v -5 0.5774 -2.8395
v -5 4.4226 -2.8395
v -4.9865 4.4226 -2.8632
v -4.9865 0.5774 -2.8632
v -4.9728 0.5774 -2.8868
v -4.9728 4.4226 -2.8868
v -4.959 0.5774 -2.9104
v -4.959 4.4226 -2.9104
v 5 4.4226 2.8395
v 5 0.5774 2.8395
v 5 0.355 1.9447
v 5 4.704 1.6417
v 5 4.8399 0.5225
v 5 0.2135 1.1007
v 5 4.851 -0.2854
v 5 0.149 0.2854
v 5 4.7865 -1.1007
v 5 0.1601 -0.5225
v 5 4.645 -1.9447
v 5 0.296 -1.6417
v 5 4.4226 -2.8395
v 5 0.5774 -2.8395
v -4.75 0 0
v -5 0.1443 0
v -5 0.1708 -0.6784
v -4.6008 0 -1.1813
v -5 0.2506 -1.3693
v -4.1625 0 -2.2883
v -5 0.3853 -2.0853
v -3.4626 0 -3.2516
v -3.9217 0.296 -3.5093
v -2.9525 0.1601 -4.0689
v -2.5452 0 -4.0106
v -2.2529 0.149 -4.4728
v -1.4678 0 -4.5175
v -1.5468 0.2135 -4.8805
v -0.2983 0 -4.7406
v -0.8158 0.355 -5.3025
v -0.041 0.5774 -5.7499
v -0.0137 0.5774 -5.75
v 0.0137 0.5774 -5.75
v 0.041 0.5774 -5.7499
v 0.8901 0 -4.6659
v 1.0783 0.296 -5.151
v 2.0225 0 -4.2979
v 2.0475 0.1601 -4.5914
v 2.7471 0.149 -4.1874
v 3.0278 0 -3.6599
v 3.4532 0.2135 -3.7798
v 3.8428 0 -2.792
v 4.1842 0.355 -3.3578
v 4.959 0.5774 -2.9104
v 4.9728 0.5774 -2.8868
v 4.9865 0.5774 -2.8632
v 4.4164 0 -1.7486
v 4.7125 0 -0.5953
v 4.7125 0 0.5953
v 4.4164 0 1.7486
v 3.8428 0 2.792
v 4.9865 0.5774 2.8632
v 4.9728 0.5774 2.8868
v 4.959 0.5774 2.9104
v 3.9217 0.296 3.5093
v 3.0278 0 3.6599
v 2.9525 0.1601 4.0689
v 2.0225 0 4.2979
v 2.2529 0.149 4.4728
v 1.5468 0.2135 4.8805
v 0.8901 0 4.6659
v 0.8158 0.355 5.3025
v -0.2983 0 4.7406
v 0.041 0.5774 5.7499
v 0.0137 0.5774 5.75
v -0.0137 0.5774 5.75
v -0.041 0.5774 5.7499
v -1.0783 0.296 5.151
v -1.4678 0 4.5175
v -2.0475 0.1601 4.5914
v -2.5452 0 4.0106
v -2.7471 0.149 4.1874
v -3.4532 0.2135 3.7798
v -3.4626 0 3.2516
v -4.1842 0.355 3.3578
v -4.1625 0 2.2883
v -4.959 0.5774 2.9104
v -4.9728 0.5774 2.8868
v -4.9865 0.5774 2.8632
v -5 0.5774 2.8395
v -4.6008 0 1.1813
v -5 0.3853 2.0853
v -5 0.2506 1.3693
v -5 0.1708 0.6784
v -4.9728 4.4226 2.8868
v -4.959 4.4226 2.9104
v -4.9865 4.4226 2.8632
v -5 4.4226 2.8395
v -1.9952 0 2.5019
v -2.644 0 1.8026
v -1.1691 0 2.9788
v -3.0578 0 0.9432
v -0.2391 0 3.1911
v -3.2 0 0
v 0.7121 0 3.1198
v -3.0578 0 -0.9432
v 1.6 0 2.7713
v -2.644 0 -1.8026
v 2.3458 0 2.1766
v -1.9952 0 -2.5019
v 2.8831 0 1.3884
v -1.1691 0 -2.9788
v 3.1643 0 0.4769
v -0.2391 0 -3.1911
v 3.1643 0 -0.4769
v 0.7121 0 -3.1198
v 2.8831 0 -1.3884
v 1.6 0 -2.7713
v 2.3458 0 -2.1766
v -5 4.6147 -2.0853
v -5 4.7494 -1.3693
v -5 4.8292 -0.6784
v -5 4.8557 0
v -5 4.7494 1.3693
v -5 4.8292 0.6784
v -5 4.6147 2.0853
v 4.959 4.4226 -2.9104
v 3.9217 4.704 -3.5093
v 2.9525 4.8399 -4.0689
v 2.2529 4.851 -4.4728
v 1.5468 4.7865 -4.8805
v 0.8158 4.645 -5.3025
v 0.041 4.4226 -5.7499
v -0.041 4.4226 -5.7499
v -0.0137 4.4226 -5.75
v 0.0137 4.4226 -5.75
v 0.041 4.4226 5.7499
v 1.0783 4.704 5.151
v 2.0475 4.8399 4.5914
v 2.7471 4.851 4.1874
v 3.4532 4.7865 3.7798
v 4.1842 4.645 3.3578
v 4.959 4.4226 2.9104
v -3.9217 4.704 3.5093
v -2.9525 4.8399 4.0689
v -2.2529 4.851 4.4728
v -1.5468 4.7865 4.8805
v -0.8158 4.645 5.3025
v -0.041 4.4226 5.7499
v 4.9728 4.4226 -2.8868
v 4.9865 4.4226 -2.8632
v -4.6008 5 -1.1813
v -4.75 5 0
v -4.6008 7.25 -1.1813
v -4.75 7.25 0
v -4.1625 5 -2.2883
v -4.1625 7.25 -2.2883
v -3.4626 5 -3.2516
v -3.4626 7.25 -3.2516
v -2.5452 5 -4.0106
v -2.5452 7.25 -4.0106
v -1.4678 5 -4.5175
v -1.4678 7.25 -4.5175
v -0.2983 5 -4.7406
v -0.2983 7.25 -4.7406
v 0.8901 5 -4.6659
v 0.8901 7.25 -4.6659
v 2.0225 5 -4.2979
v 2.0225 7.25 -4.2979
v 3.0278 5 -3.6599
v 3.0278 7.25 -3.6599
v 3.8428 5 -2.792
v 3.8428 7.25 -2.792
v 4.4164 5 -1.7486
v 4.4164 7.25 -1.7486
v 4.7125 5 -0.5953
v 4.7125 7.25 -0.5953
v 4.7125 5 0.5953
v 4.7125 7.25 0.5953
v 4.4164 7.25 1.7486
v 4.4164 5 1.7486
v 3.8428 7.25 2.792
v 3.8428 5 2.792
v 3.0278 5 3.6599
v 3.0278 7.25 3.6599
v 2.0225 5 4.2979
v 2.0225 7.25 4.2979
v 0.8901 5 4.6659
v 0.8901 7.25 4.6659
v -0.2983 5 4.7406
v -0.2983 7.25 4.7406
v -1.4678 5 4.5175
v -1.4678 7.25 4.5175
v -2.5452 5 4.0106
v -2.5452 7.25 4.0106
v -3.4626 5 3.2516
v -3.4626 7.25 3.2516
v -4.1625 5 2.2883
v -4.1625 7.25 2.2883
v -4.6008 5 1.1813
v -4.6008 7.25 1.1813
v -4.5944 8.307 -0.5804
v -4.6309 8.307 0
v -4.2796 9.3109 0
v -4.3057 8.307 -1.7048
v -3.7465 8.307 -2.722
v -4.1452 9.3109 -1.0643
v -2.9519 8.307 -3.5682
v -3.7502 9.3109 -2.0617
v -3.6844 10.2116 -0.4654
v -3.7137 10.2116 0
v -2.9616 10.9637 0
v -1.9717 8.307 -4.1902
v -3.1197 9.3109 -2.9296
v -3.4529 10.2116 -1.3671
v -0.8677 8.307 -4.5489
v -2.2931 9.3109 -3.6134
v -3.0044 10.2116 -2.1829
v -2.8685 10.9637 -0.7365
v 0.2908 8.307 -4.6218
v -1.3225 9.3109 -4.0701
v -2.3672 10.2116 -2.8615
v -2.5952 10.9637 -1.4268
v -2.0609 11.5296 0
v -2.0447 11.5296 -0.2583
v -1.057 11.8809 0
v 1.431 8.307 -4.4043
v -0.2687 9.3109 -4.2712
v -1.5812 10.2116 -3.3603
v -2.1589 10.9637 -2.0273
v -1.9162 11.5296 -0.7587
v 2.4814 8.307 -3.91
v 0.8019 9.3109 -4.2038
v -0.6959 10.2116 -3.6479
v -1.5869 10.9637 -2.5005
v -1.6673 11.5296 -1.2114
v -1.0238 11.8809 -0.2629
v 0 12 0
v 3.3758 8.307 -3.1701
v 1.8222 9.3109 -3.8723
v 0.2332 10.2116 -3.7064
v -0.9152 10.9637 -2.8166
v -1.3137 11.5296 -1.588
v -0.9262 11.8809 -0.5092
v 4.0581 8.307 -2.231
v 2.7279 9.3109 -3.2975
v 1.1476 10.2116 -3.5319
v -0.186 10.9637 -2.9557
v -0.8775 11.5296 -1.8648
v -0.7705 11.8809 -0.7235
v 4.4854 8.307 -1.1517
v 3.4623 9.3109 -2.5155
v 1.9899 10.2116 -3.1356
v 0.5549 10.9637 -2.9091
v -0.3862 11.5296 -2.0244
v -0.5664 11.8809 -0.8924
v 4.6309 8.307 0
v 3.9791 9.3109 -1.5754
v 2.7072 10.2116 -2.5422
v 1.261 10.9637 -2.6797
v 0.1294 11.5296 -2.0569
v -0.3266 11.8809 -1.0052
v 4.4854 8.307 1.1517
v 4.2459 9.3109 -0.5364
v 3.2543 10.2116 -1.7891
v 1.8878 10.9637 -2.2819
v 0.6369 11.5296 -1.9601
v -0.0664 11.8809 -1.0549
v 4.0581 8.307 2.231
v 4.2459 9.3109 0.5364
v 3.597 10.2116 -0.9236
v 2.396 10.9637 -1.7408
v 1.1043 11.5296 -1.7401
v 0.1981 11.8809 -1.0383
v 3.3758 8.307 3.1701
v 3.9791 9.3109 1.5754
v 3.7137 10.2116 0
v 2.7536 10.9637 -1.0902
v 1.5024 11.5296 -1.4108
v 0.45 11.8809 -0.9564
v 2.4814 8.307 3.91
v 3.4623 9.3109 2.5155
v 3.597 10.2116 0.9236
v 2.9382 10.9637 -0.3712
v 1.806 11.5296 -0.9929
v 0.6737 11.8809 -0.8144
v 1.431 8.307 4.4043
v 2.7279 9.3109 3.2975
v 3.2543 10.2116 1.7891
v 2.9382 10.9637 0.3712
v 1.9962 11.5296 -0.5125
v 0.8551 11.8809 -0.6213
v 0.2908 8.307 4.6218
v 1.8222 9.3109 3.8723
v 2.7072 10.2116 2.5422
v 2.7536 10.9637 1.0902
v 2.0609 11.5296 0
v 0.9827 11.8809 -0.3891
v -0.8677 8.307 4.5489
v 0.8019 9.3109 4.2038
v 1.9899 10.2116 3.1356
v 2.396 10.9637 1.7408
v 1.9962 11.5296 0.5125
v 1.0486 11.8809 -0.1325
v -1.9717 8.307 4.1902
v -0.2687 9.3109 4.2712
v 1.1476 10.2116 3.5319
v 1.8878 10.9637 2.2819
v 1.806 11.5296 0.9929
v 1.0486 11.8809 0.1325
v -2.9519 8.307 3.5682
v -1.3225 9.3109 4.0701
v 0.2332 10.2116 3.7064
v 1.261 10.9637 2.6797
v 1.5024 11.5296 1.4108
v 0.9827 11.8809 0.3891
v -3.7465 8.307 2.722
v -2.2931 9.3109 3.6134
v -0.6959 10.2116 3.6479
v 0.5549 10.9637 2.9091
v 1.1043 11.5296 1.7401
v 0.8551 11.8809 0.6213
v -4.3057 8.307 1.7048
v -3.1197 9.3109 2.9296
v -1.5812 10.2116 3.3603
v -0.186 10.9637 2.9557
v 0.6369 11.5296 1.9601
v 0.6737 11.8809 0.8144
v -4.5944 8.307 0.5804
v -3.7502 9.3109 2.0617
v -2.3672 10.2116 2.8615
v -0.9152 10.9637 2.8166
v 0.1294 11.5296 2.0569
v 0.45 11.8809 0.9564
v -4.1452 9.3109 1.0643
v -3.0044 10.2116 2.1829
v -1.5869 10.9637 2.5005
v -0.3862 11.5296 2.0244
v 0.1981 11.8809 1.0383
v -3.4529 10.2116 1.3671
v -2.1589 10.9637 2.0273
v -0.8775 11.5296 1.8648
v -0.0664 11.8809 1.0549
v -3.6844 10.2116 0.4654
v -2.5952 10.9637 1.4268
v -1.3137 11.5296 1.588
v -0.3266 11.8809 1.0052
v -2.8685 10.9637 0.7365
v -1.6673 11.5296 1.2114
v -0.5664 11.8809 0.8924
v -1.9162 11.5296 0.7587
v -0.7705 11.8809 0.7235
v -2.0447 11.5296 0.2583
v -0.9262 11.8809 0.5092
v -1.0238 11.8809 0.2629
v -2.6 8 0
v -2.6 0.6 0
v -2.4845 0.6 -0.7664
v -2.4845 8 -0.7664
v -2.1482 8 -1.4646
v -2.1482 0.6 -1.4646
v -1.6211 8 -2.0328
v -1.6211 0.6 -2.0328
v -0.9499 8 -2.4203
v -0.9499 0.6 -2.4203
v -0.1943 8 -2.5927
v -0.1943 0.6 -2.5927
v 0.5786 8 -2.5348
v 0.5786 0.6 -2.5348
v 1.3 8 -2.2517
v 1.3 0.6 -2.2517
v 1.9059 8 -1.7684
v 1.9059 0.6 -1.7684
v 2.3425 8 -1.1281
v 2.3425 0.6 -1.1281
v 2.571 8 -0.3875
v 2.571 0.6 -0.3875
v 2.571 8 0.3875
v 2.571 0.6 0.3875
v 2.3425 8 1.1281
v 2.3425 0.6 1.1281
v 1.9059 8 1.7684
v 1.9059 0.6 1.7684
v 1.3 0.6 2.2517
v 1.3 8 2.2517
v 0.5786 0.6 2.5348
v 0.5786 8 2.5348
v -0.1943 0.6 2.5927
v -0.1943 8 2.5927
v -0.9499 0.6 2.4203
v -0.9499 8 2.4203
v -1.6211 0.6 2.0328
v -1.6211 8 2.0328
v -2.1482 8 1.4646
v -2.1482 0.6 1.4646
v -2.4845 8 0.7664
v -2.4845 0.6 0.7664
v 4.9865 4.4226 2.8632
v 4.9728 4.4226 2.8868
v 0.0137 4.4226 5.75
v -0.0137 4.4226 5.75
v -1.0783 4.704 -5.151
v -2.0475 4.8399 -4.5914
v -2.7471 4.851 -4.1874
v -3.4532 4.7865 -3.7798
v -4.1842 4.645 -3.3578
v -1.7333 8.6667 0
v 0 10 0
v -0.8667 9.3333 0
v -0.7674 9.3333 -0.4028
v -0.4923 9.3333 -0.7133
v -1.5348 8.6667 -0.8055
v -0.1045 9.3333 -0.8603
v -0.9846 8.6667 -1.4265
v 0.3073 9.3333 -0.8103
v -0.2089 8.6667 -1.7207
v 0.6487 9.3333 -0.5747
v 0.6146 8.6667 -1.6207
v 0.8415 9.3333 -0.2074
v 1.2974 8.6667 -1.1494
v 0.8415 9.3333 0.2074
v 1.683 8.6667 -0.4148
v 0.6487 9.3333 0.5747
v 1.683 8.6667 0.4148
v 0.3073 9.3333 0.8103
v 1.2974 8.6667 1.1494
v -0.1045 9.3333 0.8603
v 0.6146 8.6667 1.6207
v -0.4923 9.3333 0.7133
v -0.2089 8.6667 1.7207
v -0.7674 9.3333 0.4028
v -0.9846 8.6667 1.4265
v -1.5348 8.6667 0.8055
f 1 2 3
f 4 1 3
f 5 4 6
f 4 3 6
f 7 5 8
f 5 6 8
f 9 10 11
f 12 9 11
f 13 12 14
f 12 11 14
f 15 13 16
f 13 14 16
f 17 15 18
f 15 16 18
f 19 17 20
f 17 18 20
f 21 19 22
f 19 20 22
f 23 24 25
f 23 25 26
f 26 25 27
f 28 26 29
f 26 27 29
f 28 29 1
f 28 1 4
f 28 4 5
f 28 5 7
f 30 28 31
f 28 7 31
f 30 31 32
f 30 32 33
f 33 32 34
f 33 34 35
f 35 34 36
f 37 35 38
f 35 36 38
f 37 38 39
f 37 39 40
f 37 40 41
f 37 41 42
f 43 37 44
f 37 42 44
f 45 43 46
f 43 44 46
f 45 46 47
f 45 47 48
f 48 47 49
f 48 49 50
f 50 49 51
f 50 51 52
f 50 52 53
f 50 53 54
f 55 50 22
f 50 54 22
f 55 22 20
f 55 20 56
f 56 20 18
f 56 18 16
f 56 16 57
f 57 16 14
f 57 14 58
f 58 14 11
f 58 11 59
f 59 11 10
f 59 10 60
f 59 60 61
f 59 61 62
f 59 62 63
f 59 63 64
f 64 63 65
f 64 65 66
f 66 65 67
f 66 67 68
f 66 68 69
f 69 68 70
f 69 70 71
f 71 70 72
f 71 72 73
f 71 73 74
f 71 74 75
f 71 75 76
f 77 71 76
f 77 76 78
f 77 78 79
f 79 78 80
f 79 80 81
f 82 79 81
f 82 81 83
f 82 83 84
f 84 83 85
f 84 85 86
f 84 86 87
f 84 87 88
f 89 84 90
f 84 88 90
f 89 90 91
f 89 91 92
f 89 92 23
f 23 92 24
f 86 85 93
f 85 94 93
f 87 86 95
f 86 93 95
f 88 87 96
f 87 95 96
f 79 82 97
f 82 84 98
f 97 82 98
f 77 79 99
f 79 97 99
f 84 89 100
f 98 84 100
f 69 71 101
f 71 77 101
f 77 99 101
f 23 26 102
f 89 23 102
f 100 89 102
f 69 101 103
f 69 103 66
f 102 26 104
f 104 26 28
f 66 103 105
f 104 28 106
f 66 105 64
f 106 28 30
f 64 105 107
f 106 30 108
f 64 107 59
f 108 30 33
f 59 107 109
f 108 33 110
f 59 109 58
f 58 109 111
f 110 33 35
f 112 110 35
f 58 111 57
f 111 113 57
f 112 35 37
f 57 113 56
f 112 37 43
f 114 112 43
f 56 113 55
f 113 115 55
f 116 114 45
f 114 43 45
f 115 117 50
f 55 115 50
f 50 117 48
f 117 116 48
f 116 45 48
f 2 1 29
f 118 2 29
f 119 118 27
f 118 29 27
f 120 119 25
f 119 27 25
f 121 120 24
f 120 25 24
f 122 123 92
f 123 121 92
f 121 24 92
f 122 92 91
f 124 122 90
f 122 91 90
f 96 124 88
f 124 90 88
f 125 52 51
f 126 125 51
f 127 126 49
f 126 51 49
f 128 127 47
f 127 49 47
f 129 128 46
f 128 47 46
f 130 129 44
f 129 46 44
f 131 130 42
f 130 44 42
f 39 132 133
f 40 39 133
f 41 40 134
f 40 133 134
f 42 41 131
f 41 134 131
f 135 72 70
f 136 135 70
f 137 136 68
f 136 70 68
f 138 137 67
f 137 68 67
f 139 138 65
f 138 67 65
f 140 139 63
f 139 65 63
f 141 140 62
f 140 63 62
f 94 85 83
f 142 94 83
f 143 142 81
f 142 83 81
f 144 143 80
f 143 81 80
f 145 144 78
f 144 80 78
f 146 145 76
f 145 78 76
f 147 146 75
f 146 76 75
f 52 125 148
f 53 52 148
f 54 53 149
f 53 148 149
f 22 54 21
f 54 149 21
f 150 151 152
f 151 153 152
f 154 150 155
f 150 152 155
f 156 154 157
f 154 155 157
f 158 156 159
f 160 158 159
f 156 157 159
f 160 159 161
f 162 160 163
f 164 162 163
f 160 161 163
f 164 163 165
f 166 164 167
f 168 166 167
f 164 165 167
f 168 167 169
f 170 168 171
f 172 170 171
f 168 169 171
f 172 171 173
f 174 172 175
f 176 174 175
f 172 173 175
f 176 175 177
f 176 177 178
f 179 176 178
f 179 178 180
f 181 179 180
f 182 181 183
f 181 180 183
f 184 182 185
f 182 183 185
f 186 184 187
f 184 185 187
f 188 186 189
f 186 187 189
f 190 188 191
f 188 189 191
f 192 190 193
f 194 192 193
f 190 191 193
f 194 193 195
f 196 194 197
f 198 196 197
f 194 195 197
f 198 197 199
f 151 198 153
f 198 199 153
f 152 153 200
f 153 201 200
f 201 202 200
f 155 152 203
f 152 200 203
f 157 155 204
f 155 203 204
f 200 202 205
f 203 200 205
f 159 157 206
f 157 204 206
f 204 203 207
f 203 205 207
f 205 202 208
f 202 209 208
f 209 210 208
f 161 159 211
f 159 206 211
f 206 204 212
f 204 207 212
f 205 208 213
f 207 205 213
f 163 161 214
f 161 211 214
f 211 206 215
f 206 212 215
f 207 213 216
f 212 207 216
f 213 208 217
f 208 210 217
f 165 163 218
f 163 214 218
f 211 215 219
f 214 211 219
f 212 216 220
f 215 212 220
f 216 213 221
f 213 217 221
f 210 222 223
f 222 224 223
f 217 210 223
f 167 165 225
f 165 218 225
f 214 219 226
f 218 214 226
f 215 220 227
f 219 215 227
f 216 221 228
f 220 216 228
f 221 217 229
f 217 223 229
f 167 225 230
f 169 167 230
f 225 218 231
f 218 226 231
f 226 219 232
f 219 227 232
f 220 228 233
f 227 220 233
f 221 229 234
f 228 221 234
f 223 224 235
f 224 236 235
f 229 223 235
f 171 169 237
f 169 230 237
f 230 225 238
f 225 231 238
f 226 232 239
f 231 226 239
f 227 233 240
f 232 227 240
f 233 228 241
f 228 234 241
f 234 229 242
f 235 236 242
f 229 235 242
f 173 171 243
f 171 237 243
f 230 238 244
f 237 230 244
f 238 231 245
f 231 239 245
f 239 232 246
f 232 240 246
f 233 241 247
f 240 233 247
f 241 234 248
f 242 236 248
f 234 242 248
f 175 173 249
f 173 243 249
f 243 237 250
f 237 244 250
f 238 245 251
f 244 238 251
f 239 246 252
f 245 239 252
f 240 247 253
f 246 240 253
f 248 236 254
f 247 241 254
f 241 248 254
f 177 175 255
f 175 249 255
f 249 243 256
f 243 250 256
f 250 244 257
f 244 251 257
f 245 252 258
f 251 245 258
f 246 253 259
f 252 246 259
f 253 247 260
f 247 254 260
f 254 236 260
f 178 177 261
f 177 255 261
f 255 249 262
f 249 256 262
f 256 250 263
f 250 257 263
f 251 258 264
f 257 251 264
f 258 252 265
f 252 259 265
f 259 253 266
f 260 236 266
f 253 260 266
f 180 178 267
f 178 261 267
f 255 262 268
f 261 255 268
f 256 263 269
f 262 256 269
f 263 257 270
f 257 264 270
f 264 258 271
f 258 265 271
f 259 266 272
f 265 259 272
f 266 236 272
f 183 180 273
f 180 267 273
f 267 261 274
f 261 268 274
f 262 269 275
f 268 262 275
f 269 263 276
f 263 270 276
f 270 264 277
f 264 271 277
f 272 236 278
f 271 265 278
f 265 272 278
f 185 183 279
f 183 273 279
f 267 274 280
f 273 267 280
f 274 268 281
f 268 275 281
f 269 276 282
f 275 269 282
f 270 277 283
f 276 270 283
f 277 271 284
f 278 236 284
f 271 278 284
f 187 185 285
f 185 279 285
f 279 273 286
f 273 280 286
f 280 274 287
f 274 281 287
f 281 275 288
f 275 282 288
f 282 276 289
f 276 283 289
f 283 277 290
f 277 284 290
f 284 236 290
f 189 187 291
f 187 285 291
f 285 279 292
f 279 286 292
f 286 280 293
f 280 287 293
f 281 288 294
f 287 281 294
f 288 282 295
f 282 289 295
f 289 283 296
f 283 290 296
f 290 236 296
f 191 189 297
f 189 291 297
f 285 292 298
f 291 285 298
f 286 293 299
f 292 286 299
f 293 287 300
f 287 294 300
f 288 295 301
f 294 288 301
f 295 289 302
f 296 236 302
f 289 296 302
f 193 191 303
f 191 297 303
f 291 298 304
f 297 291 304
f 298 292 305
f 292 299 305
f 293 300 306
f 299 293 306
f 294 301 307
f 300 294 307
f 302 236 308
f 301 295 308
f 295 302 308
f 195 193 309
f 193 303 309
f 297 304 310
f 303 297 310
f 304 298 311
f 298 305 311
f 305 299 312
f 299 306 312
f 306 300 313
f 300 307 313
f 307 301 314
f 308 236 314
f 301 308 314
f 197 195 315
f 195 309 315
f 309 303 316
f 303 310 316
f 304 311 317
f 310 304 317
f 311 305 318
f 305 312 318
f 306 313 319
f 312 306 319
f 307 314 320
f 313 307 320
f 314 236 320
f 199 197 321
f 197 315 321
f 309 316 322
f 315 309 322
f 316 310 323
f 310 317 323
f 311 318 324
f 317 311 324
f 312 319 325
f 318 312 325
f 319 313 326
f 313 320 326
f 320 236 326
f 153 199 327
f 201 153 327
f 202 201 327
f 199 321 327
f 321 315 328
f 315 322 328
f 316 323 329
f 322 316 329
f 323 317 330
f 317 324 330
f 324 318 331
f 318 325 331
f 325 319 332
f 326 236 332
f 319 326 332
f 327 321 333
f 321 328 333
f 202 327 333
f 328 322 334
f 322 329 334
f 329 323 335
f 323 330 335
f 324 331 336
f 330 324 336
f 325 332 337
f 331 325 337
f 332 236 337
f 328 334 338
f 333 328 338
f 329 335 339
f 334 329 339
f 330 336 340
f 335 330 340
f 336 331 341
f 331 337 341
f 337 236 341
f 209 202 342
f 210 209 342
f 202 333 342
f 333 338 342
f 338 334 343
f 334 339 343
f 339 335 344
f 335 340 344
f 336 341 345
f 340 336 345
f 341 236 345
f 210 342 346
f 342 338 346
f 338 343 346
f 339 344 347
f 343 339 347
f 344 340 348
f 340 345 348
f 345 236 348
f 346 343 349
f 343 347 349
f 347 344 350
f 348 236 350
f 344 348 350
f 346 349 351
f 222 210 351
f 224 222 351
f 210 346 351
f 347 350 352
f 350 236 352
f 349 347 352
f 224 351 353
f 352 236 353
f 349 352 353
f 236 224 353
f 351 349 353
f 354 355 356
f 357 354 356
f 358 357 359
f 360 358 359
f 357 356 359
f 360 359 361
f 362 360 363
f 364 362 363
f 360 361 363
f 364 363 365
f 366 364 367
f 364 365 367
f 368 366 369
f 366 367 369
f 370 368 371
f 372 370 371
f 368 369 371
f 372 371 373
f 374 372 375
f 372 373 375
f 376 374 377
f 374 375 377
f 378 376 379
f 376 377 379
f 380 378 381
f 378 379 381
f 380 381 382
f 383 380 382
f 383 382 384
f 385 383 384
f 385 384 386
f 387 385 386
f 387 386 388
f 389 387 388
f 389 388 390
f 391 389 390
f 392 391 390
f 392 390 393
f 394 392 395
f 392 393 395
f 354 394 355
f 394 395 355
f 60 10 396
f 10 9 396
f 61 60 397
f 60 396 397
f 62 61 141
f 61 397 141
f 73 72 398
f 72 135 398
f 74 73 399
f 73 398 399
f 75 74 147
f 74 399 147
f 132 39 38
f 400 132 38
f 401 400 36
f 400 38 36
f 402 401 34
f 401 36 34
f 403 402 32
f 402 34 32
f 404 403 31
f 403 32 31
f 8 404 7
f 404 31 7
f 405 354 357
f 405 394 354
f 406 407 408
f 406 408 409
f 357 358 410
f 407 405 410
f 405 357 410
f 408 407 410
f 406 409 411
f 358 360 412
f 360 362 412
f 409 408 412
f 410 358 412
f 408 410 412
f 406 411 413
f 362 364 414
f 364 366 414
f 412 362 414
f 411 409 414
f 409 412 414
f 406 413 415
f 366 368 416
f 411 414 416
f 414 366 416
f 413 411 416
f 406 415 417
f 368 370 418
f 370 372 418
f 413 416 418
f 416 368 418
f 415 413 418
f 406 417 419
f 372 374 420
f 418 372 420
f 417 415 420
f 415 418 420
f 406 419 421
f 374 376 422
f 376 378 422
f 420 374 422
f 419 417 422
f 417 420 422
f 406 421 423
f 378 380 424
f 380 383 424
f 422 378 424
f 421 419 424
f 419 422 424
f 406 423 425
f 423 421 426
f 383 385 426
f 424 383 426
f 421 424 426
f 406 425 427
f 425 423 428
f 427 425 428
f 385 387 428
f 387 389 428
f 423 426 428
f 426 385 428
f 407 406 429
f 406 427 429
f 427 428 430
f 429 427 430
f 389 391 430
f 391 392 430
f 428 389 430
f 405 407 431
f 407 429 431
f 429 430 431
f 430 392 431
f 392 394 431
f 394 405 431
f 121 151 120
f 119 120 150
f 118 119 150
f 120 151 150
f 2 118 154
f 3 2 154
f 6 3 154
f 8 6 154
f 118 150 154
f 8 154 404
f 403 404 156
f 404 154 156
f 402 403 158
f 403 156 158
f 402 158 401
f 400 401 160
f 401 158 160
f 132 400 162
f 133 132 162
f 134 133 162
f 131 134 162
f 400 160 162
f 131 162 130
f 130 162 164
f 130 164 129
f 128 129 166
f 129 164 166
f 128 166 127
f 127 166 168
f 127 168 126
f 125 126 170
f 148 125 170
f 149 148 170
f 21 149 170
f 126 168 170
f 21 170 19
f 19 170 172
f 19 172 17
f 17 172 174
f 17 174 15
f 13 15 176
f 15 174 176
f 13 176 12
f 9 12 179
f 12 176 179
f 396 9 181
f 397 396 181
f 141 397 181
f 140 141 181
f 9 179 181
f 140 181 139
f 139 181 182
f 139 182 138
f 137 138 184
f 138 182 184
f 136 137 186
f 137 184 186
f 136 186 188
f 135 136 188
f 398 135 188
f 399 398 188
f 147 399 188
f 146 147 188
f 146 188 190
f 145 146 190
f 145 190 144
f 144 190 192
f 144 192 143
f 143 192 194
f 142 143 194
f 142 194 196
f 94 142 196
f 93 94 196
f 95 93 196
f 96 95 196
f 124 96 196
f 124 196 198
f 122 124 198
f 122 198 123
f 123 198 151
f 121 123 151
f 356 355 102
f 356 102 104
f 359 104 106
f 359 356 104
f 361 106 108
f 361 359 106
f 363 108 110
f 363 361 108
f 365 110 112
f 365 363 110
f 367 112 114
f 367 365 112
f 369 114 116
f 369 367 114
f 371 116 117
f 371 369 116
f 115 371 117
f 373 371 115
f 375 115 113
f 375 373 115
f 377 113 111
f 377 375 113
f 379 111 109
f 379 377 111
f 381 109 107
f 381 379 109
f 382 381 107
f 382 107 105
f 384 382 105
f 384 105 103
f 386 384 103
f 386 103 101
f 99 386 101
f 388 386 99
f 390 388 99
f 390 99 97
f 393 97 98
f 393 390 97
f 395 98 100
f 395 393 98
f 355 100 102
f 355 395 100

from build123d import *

# Parameters (mm, degrees)
SKETCH_2_OUTSIDE_W  = 17.542
SKETCH_2_OUTSIDE_H  = 17.542
CUT_EXTRUDE_1_DEPTH = 15.495689014
CHAMFER_1_SIZE      = 0.6


with BuildPart() as part:
    # Эскиз1 → Revolve 782 (revolve)
    with BuildSketch(Plane.XY, mode=Mode.PRIVATE) as revolve_782_sk:
        with BuildLine():
            Line((5.75, 0.577350269), (5.75, 4.422649731))
            Line((5.75, 4.422649731), (4.75, 5))
            Line((4.75, 5), (4.75, 7.25))
            ThreePointArc((4.75, 7.25), (3.358757211, 10.608757211), (0, 12))
            Line((0, 12), (0, 10))
            Line((0, 10), (2.6, 8))
            Line((2.6, 8), (2.6, 0))
            Line((2.6, 0), (4.75, 0))
            Line((4.75, 0), (5.75, 0.577350269))
        make_face()
    revolve(revolve_782_sk.sketch.rotate(Axis((0, 18.372325569, 0), (0, -1, 0)), 180), axis=Axis((0, 18.372325569, 0), (0, -1, 0)))

    # Эскиз2 outside → Вырез-Вытянуть1 (cut, through all)
    with BuildSketch(Plane(origin=(0, 0, 0), x_dir=(1, 0, 0), z_dir=(0, 1, 0))):
        Rectangle(SKETCH_2_OUTSIDE_W, SKETCH_2_OUTSIDE_H)
        Polygon((0, 5.773502692), (-5, 2.886751346), (-5, -2.886751346), (0, -5.773502692), (5, -2.886751346), (5, 2.886751346), align=None, mode=Mode.SUBTRACT)
    extrude(amount=CUT_EXTRUDE_1_DEPTH, mode=Mode.SUBTRACT)

    # Фаска1
    chamfer_1_edges = [part.edges().sort_by_distance(p)[0] for p in [
        (2.6, 0, 0),
    ]]
    chamfer(chamfer_1_edges, length=CHAMFER_1_SIZE)


solid = part.part
